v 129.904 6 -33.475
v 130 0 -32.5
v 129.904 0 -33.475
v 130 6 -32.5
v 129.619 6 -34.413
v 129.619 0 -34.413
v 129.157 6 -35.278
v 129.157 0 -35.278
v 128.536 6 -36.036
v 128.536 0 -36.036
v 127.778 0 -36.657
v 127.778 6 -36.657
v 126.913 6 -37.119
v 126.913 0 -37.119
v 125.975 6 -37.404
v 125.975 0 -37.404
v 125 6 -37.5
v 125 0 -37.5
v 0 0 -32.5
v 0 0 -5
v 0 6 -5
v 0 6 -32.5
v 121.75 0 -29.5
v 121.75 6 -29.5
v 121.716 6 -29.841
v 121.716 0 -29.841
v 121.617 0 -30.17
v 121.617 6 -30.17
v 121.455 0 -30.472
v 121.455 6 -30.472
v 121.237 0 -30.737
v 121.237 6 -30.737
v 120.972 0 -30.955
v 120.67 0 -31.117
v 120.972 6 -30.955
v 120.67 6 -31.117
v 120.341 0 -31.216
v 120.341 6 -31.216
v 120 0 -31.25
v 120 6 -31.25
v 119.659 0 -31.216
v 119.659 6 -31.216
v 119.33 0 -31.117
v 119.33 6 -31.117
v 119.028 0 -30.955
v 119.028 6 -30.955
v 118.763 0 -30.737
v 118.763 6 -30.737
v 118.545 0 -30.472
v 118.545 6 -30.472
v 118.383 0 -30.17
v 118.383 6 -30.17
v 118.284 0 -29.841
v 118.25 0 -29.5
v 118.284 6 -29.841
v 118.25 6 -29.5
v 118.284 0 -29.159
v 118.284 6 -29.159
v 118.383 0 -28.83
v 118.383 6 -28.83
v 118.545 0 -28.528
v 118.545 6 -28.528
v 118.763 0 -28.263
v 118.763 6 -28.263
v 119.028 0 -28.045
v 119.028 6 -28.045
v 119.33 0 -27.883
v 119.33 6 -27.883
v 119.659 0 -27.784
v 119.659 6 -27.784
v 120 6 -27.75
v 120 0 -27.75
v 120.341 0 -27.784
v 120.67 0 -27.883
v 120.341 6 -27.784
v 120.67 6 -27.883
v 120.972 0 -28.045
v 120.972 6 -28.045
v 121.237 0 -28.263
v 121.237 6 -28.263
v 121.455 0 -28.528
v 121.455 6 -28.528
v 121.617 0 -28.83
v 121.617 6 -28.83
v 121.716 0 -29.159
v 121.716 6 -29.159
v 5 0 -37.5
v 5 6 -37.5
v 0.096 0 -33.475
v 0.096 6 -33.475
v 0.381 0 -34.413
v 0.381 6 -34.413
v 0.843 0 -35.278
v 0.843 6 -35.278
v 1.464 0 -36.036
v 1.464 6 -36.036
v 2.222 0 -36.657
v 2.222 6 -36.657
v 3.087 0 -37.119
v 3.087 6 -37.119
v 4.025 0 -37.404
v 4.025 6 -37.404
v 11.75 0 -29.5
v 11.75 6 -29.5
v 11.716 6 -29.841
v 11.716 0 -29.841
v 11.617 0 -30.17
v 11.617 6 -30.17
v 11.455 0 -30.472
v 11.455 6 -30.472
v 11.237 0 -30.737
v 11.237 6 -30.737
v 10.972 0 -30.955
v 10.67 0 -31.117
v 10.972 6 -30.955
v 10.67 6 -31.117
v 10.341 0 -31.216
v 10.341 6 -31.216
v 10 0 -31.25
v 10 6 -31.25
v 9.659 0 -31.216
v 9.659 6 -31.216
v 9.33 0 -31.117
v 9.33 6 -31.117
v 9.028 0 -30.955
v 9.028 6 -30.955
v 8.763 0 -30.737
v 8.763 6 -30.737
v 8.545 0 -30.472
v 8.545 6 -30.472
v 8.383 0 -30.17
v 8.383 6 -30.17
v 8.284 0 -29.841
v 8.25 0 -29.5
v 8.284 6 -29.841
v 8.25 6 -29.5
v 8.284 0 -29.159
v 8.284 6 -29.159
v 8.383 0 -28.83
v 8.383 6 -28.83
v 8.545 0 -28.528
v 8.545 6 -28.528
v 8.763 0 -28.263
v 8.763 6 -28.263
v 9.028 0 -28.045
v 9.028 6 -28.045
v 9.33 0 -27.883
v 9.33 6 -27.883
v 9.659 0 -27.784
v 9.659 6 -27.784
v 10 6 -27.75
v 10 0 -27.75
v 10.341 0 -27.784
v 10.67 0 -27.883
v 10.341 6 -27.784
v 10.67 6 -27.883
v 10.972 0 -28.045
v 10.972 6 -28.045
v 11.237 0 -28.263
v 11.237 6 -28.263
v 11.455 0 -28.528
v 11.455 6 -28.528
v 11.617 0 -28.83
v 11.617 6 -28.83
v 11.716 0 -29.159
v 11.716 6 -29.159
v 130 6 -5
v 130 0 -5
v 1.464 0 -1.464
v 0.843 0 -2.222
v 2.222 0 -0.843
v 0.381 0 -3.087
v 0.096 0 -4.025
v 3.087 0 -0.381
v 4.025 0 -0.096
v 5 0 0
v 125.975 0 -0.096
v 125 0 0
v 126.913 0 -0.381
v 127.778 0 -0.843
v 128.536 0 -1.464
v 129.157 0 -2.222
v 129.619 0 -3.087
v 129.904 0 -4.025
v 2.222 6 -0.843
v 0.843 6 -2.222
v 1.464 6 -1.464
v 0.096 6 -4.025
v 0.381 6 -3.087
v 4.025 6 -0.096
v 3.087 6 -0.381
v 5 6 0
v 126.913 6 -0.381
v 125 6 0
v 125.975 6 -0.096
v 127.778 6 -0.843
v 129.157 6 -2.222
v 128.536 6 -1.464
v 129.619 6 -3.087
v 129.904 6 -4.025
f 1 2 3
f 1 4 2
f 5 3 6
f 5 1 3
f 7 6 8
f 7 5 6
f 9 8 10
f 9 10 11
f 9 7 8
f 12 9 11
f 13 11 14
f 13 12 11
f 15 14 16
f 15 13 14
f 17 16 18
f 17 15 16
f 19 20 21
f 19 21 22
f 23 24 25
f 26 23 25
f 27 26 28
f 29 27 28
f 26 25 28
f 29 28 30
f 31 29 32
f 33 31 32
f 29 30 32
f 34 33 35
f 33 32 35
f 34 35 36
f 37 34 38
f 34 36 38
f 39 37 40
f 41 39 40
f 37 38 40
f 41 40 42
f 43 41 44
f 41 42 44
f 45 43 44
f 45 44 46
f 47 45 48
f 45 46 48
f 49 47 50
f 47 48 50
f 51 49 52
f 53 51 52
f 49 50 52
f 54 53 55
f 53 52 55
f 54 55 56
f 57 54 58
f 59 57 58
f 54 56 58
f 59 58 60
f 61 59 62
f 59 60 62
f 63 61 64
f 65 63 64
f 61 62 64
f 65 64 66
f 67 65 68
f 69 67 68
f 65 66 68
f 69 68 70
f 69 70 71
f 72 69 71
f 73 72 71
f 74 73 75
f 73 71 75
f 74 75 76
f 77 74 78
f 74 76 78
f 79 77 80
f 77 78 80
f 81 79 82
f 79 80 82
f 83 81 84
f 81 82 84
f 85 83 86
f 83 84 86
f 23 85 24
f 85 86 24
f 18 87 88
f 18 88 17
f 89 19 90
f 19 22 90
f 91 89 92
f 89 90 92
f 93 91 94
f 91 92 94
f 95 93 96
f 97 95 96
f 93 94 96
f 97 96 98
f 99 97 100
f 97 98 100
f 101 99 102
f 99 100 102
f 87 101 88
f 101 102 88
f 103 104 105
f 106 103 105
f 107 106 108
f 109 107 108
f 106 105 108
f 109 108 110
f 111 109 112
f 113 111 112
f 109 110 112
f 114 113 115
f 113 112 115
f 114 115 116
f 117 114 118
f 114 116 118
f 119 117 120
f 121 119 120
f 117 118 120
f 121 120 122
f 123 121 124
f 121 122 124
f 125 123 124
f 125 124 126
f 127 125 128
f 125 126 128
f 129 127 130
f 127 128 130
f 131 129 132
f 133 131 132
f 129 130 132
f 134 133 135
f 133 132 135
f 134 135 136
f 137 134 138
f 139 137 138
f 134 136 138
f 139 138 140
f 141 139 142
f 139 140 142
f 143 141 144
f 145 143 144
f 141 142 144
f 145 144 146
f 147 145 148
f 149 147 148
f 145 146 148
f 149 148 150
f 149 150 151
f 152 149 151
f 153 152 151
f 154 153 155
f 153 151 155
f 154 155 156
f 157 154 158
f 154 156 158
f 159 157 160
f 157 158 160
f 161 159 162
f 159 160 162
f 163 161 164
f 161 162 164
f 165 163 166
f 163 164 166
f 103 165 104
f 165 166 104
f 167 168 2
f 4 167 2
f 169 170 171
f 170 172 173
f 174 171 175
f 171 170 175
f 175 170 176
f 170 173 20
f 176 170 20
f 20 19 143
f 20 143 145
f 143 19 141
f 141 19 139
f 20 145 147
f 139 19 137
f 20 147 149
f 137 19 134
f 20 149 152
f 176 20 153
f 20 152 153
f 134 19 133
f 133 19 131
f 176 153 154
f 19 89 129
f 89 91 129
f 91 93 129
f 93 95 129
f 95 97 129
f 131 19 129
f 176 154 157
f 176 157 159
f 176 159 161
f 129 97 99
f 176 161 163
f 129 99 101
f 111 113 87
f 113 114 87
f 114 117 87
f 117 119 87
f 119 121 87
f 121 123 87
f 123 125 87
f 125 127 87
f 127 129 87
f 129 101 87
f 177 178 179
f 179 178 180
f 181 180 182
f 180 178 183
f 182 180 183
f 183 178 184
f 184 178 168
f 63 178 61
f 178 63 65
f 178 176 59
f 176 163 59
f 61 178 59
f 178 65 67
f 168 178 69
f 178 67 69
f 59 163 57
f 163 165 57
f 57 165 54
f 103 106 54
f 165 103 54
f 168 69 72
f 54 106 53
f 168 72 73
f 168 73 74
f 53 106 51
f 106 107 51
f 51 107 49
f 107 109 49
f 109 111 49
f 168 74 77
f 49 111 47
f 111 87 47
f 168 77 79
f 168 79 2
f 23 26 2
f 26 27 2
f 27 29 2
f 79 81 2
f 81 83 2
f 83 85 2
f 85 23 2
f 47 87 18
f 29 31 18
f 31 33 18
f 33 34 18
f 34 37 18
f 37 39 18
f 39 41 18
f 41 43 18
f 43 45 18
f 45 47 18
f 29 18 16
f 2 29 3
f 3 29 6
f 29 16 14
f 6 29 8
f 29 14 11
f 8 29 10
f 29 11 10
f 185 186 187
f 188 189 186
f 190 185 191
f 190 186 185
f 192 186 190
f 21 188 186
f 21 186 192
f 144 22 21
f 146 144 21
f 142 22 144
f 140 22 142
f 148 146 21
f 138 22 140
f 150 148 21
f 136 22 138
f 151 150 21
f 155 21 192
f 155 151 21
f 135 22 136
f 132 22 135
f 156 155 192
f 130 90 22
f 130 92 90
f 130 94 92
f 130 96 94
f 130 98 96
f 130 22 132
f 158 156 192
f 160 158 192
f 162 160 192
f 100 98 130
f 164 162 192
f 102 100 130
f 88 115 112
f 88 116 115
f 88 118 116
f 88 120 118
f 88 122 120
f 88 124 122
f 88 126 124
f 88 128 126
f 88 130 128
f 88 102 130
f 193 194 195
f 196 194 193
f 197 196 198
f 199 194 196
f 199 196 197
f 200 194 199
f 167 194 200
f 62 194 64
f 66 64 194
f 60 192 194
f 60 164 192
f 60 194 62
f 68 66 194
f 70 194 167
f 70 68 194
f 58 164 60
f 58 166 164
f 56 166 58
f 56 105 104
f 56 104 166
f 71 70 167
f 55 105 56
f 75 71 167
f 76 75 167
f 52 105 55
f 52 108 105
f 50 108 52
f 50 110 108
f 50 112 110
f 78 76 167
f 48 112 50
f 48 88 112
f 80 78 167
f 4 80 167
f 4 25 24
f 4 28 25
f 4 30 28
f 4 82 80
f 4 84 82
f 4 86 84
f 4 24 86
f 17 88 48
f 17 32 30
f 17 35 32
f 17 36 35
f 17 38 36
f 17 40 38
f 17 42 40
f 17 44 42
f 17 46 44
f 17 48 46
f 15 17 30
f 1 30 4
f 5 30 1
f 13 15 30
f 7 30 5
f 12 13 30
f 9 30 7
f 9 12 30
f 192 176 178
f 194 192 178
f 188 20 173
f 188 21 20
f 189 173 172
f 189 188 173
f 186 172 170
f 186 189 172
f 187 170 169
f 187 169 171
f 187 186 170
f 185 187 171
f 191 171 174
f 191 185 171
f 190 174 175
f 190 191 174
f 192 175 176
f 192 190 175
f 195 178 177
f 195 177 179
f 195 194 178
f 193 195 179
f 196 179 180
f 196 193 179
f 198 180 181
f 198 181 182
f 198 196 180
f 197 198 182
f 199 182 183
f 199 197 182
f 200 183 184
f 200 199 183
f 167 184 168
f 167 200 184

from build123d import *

# Parameters (mm, degrees)
SKETCH1_W           = 130
SKETCH1_H           = 37.5
BOSS_EXTRUDE1_DEPTH = 6
FILLET1_R           = 5
SKETCH2_R           = 1.75
CUT_EXTRUDE1_DEPTH  = 6


with BuildPart() as part:
    # Sketch1 → Boss-Extrude1 (new body)
    with BuildSketch(Plane(origin=(0, 0, 0), x_dir=(1, 0, 0), z_dir=(0, 1, 0))):
        with Locations((65, 18.75)):
            Rectangle(SKETCH1_W, SKETCH1_H)
    extrude(amount=BOSS_EXTRUDE1_DEPTH)

    # Fillet1
    fillet1_edges = [part.edges().sort_by_distance(p)[0] for p in [
        (0, 3, -37.5),
        (130, 3, -37.5),
        (130, 3, 0),
        (0, 3, 0),
    ]]
    fillet(fillet1_edges, radius=FILLET1_R)

    # Sketch2 → Cut-Extrude1 (cut)
    with BuildSketch(Plane(origin=(0, 6, 0), x_dir=(1, 0, 0), z_dir=(0, 1, 0))):
        with Locations((10, 29.5)):
            Circle(SKETCH2_R)
        with Locations((120, 29.5)):
            Circle(SKETCH2_R)
    extrude(amount=-CUT_EXTRUDE1_DEPTH, mode=Mode.SUBTRACT)


solid = part.part
